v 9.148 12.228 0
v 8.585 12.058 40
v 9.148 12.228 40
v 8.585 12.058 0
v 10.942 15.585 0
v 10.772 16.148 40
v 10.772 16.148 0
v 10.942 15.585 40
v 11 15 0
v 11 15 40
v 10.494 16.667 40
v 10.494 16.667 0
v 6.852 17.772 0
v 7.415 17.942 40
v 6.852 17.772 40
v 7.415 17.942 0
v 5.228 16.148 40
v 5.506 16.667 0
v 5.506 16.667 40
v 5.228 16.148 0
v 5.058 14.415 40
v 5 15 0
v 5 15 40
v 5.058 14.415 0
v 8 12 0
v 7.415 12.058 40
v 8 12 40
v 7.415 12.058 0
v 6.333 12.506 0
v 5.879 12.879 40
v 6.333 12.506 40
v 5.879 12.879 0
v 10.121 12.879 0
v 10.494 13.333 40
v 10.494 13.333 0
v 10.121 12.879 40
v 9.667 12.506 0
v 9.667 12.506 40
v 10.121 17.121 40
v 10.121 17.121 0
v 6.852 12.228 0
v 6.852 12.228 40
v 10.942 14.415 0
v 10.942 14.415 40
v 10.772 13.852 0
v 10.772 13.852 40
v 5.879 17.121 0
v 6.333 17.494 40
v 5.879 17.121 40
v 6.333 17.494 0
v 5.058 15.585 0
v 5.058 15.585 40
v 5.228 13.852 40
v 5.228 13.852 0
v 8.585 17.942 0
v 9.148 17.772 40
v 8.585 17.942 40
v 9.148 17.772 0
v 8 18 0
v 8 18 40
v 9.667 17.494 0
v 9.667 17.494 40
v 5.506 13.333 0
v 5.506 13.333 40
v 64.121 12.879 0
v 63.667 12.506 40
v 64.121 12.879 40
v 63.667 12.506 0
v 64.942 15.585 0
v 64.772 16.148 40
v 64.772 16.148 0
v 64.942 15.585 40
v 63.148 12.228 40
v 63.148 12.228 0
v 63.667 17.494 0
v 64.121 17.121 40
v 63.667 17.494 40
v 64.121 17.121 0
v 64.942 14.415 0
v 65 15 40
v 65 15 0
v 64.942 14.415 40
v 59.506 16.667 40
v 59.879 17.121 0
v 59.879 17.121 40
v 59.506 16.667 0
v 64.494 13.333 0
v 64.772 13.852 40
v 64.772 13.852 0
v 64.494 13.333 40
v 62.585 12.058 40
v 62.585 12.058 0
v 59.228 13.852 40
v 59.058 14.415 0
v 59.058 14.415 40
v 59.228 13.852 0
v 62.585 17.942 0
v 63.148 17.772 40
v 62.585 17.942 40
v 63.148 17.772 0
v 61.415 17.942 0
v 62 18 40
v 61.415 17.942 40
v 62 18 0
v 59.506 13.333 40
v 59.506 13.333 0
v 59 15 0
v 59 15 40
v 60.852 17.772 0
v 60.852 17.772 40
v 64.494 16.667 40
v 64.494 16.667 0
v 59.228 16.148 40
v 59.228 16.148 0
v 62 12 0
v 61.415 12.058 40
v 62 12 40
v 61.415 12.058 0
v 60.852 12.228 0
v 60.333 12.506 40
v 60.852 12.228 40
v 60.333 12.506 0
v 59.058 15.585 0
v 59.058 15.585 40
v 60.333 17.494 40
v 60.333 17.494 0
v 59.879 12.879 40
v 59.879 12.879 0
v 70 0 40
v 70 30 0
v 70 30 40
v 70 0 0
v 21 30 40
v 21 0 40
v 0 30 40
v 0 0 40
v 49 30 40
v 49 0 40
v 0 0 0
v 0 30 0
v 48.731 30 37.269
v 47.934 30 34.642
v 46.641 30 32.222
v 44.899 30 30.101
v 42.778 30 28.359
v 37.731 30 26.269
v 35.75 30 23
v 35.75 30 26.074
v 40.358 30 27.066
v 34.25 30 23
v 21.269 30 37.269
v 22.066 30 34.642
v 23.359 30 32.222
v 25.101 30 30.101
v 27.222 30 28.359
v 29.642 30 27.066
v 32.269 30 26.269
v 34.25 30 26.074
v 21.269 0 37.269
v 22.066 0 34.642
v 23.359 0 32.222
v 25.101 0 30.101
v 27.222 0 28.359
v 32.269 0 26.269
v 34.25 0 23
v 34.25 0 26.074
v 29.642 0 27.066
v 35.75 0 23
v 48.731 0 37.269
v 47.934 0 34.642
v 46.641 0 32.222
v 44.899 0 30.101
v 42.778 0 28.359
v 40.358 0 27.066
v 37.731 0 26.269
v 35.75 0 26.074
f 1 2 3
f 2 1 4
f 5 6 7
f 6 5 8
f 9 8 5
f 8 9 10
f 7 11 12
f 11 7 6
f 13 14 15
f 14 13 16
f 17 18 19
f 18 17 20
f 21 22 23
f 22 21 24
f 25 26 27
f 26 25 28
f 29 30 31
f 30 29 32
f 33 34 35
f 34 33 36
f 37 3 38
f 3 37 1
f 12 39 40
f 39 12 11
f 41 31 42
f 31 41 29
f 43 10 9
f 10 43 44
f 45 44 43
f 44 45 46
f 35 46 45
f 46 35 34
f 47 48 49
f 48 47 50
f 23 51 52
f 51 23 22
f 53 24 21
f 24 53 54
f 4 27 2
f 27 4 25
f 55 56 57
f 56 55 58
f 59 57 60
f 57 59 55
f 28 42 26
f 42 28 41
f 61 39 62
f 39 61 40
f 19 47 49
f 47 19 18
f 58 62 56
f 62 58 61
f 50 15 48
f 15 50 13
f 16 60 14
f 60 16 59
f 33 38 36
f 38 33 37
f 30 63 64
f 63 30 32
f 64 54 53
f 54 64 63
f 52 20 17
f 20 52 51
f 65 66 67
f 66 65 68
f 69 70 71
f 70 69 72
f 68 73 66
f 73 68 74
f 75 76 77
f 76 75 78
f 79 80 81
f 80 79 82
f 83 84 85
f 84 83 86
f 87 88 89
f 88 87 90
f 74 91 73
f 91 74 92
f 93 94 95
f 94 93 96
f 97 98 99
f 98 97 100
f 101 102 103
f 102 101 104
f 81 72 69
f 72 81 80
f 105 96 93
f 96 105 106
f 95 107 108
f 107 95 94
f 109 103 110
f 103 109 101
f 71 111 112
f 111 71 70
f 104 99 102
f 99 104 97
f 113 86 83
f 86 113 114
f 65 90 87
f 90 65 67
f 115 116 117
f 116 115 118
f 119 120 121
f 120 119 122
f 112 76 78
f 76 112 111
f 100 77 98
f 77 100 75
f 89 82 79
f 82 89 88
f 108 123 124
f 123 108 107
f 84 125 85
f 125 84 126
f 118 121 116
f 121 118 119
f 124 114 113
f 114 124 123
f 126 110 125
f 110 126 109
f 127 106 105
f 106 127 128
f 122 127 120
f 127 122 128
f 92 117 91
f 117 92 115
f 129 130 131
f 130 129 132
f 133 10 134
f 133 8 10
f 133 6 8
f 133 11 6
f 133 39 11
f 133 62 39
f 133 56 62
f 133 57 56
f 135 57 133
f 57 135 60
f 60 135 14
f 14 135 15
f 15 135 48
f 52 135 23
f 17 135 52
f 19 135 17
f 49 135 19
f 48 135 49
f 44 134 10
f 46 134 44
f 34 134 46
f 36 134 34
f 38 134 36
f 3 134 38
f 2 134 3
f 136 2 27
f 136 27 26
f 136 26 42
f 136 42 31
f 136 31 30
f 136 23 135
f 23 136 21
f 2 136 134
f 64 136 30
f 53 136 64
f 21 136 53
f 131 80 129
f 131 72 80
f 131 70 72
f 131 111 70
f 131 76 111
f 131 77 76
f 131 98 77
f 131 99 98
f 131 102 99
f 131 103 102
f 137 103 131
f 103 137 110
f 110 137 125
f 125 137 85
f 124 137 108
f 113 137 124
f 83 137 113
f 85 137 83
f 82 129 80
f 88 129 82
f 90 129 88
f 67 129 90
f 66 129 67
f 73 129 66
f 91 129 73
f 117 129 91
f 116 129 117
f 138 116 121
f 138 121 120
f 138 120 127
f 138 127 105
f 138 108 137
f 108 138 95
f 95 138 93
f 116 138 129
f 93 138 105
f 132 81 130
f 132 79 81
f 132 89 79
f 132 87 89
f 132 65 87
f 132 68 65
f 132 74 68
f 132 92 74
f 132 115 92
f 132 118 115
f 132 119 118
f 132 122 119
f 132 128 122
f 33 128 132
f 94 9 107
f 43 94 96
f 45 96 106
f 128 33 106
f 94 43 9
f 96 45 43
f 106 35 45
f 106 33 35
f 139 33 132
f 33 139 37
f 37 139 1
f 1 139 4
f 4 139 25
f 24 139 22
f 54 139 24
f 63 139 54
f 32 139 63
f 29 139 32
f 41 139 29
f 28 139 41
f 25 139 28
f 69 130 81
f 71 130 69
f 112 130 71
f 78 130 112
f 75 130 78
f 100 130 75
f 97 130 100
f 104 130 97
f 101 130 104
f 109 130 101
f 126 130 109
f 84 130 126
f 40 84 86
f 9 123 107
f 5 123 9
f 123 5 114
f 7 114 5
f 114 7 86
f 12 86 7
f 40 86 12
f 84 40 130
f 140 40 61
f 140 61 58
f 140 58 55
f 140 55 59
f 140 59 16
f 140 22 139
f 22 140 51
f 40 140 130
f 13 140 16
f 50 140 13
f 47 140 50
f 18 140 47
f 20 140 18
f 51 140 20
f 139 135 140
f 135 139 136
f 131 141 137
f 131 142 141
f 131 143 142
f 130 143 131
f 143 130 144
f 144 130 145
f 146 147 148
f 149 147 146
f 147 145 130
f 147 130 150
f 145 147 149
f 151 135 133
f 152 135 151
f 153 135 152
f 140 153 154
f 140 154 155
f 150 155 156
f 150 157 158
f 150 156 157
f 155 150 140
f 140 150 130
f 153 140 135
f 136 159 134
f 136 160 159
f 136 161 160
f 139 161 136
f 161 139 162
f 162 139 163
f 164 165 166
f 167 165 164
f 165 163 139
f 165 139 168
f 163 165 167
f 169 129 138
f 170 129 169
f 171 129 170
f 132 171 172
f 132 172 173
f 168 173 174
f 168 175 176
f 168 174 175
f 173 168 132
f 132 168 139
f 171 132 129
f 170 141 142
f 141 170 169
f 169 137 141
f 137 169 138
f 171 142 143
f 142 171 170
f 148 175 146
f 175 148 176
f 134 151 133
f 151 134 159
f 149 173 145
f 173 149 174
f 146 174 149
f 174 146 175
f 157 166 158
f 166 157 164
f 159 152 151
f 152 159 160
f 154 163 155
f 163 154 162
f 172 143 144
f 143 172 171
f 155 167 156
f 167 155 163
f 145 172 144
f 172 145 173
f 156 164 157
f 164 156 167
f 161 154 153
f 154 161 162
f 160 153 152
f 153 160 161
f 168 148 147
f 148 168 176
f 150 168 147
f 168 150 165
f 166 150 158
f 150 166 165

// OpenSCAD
$fn = 32;

// ----------------------------------------------------------------------
// Saddle clamp: split shaft clamp
// ----------------------------------------------------------------------

// --- parameters (mm) ---
blk_l = 70;               // block length, X
blk_w = 30;               // block width, Y
blk_h = 40;               // block height
clamp_r = 14;             // shaft groove radius
hole_r = 3;               // bolt hole radius
hole_m = 8;               // bolt hole margin from the ends
saw_w = 1.5;              // saw kerf width

saw_depth = clamp_r + 3;  // saw kerf depth

difference() {
  cube([blk_l, blk_w, blk_h]);
  translate([blk_l / 2, -1, blk_h])
    rotate([-90, 0, 0])
      cylinder(h = blk_w + 2, r = clamp_r);
  for (sx = [0, 1])
    translate([sx ? blk_l - hole_m : hole_m, blk_w / 2, -1])
      cylinder(r = hole_r, h = blk_h + 2);
  translate([blk_l / 2 - saw_w / 2, -1, blk_h - saw_depth])
    cube([saw_w, blk_w + 2, saw_depth + 1]);
}
